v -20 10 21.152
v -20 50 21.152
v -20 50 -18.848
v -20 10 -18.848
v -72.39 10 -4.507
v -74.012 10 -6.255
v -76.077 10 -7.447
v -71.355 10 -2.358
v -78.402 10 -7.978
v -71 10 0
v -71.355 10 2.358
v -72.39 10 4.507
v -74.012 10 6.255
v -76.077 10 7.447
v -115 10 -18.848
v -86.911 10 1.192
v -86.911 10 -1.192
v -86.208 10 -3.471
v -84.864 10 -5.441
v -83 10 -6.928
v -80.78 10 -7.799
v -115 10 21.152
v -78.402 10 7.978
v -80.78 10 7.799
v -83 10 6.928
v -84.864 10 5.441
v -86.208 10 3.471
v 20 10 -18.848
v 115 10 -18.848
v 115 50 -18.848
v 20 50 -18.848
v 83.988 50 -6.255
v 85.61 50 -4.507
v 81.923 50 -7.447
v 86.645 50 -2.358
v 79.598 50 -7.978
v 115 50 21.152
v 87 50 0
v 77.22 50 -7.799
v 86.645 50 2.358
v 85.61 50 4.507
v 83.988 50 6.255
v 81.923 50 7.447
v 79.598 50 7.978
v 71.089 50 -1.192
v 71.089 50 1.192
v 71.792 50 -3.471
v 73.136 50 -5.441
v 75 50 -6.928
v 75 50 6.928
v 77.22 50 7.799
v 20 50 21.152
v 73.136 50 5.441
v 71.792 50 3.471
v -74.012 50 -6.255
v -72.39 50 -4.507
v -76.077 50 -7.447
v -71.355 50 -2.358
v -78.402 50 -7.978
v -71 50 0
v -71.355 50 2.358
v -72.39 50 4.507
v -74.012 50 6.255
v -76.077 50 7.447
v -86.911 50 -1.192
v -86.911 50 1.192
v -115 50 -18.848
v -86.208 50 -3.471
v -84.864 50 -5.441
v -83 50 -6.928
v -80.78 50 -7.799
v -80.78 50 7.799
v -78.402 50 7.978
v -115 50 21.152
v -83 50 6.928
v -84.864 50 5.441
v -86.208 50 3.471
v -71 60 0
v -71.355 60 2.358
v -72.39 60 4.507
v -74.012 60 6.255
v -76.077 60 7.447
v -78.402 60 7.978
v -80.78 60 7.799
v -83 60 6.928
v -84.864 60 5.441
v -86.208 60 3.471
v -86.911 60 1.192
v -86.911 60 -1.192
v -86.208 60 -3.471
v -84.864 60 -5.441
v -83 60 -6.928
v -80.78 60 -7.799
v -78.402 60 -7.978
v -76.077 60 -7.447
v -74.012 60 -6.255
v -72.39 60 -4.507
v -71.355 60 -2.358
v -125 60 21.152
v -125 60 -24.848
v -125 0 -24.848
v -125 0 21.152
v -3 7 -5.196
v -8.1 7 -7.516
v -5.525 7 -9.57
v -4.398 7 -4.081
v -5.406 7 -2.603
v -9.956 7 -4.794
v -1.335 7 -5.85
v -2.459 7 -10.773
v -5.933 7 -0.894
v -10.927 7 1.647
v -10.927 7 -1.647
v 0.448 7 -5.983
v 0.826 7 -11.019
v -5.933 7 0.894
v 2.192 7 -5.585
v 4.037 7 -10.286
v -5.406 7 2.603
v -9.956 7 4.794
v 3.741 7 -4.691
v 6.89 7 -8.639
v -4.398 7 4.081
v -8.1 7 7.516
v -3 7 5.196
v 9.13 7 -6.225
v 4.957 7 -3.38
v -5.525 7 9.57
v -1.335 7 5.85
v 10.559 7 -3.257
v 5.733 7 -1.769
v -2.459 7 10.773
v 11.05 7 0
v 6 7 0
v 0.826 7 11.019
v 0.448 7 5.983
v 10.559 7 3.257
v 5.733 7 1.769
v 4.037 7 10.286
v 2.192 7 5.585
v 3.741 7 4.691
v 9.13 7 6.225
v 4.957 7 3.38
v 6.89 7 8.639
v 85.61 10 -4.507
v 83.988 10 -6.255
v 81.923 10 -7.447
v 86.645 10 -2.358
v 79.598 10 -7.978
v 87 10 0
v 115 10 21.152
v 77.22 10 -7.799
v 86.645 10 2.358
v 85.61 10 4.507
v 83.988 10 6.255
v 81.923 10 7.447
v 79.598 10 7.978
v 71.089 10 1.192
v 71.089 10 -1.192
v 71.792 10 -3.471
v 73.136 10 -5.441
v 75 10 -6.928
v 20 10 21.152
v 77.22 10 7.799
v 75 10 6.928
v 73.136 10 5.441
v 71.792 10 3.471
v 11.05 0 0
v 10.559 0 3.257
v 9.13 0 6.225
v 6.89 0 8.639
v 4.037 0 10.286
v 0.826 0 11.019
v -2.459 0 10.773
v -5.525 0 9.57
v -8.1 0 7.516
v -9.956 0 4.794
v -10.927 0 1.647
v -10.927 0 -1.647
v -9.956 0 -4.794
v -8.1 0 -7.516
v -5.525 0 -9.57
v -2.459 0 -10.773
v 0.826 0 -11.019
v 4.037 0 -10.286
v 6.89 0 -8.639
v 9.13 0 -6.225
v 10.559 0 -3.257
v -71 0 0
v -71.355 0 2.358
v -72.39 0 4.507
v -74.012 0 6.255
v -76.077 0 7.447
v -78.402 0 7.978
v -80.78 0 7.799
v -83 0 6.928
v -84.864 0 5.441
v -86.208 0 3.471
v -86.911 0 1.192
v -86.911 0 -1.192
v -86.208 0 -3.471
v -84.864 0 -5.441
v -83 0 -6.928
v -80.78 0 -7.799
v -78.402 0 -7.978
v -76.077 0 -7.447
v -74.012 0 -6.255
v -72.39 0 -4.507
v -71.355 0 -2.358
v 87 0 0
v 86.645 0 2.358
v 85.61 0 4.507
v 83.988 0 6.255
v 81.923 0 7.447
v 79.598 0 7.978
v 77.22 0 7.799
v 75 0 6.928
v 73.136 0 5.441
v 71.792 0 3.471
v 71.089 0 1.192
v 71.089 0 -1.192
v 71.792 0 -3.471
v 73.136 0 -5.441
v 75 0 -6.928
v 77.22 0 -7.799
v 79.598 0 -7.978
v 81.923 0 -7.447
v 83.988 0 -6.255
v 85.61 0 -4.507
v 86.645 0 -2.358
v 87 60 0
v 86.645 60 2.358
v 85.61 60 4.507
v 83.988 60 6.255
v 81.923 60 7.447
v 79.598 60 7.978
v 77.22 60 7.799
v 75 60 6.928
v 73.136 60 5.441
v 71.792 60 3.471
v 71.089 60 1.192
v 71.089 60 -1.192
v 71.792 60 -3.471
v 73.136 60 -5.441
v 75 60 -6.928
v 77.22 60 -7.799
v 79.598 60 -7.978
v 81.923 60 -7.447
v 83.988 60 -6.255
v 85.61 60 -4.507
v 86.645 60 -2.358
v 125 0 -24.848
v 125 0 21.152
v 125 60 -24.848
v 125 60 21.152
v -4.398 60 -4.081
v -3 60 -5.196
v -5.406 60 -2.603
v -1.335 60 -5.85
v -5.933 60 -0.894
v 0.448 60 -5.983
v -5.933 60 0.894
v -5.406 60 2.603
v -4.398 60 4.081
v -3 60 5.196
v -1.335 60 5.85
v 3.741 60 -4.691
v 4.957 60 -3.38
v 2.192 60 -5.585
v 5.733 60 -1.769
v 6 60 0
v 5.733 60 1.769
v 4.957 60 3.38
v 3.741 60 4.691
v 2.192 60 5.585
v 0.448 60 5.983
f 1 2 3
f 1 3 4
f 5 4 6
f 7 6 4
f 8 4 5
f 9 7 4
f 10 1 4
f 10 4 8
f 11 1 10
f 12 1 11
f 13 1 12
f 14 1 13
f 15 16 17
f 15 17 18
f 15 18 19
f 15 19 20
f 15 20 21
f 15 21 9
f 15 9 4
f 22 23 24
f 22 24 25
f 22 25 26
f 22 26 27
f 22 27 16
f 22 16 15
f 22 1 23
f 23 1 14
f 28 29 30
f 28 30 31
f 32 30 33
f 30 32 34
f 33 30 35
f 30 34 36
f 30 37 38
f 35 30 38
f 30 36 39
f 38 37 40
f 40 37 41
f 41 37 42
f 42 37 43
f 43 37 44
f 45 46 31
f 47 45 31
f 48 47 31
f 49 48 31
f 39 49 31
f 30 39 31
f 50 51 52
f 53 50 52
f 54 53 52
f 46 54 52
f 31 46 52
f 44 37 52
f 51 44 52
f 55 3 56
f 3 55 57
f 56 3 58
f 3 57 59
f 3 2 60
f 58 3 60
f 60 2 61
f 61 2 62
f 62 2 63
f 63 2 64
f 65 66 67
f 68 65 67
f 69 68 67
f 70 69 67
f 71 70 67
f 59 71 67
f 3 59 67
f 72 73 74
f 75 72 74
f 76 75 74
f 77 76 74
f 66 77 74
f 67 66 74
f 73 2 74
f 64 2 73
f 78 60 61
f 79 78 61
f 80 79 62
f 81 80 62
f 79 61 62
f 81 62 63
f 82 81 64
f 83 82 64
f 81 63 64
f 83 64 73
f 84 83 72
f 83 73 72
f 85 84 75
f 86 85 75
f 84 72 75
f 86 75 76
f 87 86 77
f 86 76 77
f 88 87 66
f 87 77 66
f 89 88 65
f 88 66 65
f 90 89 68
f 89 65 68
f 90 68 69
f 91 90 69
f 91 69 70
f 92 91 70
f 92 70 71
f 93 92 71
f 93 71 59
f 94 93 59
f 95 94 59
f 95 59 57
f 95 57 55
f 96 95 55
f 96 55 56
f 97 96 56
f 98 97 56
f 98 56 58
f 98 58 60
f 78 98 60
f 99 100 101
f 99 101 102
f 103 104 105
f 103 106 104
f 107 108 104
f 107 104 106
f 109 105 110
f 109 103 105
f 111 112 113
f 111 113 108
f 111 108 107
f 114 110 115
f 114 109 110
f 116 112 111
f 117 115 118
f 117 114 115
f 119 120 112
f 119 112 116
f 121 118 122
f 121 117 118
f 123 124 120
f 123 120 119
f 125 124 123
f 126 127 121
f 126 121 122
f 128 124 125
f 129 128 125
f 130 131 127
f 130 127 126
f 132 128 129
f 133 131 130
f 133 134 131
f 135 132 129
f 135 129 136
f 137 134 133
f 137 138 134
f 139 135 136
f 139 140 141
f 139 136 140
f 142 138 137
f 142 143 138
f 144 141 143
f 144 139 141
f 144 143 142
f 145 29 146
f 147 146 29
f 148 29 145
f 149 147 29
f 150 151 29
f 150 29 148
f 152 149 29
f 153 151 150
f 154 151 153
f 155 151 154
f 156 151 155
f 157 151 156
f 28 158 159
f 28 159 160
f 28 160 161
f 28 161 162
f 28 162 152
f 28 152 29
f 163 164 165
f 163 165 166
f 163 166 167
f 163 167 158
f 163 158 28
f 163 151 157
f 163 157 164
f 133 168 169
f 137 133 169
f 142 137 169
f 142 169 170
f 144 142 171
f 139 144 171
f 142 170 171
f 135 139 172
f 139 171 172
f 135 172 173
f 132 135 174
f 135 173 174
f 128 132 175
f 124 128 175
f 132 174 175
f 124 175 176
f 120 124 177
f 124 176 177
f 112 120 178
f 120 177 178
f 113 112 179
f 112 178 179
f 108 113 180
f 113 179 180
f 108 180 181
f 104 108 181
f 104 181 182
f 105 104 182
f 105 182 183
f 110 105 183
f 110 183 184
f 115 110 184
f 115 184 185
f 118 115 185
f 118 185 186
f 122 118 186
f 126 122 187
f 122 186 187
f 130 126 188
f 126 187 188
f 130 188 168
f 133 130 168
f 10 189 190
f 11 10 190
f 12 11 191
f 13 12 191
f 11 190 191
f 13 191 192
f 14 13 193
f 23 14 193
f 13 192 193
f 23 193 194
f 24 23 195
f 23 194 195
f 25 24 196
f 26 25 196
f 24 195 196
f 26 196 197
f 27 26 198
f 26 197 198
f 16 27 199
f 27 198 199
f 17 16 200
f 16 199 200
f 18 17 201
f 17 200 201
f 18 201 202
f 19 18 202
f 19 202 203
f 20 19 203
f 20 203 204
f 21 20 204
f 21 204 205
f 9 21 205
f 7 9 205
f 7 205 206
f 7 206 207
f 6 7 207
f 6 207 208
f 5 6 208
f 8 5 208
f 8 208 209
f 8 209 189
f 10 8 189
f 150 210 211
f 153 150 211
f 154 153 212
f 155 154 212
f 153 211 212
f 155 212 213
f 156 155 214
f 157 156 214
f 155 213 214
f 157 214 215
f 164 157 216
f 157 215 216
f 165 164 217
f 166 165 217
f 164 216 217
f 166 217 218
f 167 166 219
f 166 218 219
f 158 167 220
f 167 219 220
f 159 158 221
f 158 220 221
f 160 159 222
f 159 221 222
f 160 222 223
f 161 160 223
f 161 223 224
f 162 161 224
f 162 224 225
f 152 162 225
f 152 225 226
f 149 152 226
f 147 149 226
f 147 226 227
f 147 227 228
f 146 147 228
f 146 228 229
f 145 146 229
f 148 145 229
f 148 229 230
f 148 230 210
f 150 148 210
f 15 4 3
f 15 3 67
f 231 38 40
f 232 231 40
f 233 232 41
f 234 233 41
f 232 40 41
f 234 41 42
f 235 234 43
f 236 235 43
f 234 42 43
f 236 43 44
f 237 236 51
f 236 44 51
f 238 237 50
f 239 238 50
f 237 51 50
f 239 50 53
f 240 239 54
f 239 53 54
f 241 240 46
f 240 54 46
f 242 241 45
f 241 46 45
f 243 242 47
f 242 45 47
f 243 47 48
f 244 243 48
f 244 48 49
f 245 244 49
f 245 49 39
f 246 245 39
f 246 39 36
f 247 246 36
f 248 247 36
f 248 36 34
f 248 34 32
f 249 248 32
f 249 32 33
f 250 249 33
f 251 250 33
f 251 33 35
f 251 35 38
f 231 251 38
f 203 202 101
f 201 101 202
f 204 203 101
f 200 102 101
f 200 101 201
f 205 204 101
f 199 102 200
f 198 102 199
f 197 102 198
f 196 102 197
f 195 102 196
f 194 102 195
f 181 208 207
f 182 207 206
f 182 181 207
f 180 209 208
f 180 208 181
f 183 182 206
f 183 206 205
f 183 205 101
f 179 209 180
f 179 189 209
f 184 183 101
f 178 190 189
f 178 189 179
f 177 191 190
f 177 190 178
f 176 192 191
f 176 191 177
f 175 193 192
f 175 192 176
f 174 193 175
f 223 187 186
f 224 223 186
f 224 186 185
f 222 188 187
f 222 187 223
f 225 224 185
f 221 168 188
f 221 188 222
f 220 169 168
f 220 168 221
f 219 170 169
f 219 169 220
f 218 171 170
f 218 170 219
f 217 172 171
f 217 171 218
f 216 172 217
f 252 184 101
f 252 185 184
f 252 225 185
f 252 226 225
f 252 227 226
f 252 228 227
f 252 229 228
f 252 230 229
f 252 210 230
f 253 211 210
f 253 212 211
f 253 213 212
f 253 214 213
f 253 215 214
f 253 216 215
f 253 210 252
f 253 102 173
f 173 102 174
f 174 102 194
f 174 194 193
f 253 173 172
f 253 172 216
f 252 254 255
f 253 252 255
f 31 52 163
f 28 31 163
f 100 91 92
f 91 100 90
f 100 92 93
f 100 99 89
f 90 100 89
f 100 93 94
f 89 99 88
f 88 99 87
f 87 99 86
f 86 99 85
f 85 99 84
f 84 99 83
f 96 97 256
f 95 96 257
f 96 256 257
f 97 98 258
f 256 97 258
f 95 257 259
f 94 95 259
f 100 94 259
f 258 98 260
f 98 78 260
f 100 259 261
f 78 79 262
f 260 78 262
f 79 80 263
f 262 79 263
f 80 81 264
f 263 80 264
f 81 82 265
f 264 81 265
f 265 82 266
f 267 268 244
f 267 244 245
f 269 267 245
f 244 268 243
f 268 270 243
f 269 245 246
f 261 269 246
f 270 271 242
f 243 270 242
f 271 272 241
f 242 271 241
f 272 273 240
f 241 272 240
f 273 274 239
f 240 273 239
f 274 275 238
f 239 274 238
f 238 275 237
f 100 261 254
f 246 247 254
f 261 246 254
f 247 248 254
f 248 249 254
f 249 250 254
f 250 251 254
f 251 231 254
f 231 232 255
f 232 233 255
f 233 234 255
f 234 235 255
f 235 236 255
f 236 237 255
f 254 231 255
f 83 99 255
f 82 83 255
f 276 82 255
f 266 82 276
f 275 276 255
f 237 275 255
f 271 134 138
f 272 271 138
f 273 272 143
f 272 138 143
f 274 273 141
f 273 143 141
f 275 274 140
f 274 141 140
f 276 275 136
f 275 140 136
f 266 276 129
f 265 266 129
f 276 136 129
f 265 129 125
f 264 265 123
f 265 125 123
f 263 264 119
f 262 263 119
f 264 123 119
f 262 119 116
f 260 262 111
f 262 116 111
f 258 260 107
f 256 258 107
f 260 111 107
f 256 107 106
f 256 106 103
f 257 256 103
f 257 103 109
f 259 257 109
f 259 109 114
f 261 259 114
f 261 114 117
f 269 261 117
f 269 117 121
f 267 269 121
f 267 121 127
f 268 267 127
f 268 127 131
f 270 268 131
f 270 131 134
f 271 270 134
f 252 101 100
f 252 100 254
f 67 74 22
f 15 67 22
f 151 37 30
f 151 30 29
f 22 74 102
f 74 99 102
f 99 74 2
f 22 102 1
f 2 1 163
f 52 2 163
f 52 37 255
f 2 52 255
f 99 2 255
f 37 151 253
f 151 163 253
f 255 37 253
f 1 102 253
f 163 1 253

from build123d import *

# Parameters (mm, degrees)
SKETCH_W        = 250
SKETCH_H        = 46
PAD_DEPTH       = 60
SKETCH001_R     = 8
SKETCH001_R_2   = 6
POCKET_DEPTH    = 60.001
SKETCH002_W     = 95
SKETCH002_H     = 40
POCKET001_DEPTH = 40
SKETCH003_R     = 11.05
POCKET002_DEPTH = 7


with BuildPart() as part:
    # Sketch → Pad (new body)
    with BuildSketch(Plane.XZ):
        with Locations((0, -1.847977)):
            Rectangle(SKETCH_W, SKETCH_H)
    extrude(amount=-PAD_DEPTH)

    # Sketch001 → Pocket (cut, through all)
    with BuildSketch(Plane.XZ):
        with Locations((-79, 0)):
            Circle(SKETCH001_R)
        Circle(SKETCH001_R_2)
        with Locations((79, 0)):
            Circle(SKETCH001_R)
    extrude(amount=-POCKET_DEPTH, mode=Mode.SUBTRACT)

    # Sketch002 → Pocket001 (cut)
    with BuildSketch(Plane(origin=(0, 0, 21.152023), x_dir=(-1, 0, 0), z_dir=(0, 0, 1))):
        with Locations((-67.5, -30)):
            Rectangle(SKETCH002_W, SKETCH002_H)
        with Locations((67.5, -30)):
            Rectangle(SKETCH002_W, SKETCH002_H)
    extrude(amount=-POCKET001_DEPTH, mode=Mode.SUBTRACT)

    # Sketch003 → Pocket002 (cut)
    with BuildSketch(Plane.XZ):
        Circle(SKETCH003_R)
    extrude(amount=-POCKET002_DEPTH, mode=Mode.SUBTRACT)


solid = part.part
